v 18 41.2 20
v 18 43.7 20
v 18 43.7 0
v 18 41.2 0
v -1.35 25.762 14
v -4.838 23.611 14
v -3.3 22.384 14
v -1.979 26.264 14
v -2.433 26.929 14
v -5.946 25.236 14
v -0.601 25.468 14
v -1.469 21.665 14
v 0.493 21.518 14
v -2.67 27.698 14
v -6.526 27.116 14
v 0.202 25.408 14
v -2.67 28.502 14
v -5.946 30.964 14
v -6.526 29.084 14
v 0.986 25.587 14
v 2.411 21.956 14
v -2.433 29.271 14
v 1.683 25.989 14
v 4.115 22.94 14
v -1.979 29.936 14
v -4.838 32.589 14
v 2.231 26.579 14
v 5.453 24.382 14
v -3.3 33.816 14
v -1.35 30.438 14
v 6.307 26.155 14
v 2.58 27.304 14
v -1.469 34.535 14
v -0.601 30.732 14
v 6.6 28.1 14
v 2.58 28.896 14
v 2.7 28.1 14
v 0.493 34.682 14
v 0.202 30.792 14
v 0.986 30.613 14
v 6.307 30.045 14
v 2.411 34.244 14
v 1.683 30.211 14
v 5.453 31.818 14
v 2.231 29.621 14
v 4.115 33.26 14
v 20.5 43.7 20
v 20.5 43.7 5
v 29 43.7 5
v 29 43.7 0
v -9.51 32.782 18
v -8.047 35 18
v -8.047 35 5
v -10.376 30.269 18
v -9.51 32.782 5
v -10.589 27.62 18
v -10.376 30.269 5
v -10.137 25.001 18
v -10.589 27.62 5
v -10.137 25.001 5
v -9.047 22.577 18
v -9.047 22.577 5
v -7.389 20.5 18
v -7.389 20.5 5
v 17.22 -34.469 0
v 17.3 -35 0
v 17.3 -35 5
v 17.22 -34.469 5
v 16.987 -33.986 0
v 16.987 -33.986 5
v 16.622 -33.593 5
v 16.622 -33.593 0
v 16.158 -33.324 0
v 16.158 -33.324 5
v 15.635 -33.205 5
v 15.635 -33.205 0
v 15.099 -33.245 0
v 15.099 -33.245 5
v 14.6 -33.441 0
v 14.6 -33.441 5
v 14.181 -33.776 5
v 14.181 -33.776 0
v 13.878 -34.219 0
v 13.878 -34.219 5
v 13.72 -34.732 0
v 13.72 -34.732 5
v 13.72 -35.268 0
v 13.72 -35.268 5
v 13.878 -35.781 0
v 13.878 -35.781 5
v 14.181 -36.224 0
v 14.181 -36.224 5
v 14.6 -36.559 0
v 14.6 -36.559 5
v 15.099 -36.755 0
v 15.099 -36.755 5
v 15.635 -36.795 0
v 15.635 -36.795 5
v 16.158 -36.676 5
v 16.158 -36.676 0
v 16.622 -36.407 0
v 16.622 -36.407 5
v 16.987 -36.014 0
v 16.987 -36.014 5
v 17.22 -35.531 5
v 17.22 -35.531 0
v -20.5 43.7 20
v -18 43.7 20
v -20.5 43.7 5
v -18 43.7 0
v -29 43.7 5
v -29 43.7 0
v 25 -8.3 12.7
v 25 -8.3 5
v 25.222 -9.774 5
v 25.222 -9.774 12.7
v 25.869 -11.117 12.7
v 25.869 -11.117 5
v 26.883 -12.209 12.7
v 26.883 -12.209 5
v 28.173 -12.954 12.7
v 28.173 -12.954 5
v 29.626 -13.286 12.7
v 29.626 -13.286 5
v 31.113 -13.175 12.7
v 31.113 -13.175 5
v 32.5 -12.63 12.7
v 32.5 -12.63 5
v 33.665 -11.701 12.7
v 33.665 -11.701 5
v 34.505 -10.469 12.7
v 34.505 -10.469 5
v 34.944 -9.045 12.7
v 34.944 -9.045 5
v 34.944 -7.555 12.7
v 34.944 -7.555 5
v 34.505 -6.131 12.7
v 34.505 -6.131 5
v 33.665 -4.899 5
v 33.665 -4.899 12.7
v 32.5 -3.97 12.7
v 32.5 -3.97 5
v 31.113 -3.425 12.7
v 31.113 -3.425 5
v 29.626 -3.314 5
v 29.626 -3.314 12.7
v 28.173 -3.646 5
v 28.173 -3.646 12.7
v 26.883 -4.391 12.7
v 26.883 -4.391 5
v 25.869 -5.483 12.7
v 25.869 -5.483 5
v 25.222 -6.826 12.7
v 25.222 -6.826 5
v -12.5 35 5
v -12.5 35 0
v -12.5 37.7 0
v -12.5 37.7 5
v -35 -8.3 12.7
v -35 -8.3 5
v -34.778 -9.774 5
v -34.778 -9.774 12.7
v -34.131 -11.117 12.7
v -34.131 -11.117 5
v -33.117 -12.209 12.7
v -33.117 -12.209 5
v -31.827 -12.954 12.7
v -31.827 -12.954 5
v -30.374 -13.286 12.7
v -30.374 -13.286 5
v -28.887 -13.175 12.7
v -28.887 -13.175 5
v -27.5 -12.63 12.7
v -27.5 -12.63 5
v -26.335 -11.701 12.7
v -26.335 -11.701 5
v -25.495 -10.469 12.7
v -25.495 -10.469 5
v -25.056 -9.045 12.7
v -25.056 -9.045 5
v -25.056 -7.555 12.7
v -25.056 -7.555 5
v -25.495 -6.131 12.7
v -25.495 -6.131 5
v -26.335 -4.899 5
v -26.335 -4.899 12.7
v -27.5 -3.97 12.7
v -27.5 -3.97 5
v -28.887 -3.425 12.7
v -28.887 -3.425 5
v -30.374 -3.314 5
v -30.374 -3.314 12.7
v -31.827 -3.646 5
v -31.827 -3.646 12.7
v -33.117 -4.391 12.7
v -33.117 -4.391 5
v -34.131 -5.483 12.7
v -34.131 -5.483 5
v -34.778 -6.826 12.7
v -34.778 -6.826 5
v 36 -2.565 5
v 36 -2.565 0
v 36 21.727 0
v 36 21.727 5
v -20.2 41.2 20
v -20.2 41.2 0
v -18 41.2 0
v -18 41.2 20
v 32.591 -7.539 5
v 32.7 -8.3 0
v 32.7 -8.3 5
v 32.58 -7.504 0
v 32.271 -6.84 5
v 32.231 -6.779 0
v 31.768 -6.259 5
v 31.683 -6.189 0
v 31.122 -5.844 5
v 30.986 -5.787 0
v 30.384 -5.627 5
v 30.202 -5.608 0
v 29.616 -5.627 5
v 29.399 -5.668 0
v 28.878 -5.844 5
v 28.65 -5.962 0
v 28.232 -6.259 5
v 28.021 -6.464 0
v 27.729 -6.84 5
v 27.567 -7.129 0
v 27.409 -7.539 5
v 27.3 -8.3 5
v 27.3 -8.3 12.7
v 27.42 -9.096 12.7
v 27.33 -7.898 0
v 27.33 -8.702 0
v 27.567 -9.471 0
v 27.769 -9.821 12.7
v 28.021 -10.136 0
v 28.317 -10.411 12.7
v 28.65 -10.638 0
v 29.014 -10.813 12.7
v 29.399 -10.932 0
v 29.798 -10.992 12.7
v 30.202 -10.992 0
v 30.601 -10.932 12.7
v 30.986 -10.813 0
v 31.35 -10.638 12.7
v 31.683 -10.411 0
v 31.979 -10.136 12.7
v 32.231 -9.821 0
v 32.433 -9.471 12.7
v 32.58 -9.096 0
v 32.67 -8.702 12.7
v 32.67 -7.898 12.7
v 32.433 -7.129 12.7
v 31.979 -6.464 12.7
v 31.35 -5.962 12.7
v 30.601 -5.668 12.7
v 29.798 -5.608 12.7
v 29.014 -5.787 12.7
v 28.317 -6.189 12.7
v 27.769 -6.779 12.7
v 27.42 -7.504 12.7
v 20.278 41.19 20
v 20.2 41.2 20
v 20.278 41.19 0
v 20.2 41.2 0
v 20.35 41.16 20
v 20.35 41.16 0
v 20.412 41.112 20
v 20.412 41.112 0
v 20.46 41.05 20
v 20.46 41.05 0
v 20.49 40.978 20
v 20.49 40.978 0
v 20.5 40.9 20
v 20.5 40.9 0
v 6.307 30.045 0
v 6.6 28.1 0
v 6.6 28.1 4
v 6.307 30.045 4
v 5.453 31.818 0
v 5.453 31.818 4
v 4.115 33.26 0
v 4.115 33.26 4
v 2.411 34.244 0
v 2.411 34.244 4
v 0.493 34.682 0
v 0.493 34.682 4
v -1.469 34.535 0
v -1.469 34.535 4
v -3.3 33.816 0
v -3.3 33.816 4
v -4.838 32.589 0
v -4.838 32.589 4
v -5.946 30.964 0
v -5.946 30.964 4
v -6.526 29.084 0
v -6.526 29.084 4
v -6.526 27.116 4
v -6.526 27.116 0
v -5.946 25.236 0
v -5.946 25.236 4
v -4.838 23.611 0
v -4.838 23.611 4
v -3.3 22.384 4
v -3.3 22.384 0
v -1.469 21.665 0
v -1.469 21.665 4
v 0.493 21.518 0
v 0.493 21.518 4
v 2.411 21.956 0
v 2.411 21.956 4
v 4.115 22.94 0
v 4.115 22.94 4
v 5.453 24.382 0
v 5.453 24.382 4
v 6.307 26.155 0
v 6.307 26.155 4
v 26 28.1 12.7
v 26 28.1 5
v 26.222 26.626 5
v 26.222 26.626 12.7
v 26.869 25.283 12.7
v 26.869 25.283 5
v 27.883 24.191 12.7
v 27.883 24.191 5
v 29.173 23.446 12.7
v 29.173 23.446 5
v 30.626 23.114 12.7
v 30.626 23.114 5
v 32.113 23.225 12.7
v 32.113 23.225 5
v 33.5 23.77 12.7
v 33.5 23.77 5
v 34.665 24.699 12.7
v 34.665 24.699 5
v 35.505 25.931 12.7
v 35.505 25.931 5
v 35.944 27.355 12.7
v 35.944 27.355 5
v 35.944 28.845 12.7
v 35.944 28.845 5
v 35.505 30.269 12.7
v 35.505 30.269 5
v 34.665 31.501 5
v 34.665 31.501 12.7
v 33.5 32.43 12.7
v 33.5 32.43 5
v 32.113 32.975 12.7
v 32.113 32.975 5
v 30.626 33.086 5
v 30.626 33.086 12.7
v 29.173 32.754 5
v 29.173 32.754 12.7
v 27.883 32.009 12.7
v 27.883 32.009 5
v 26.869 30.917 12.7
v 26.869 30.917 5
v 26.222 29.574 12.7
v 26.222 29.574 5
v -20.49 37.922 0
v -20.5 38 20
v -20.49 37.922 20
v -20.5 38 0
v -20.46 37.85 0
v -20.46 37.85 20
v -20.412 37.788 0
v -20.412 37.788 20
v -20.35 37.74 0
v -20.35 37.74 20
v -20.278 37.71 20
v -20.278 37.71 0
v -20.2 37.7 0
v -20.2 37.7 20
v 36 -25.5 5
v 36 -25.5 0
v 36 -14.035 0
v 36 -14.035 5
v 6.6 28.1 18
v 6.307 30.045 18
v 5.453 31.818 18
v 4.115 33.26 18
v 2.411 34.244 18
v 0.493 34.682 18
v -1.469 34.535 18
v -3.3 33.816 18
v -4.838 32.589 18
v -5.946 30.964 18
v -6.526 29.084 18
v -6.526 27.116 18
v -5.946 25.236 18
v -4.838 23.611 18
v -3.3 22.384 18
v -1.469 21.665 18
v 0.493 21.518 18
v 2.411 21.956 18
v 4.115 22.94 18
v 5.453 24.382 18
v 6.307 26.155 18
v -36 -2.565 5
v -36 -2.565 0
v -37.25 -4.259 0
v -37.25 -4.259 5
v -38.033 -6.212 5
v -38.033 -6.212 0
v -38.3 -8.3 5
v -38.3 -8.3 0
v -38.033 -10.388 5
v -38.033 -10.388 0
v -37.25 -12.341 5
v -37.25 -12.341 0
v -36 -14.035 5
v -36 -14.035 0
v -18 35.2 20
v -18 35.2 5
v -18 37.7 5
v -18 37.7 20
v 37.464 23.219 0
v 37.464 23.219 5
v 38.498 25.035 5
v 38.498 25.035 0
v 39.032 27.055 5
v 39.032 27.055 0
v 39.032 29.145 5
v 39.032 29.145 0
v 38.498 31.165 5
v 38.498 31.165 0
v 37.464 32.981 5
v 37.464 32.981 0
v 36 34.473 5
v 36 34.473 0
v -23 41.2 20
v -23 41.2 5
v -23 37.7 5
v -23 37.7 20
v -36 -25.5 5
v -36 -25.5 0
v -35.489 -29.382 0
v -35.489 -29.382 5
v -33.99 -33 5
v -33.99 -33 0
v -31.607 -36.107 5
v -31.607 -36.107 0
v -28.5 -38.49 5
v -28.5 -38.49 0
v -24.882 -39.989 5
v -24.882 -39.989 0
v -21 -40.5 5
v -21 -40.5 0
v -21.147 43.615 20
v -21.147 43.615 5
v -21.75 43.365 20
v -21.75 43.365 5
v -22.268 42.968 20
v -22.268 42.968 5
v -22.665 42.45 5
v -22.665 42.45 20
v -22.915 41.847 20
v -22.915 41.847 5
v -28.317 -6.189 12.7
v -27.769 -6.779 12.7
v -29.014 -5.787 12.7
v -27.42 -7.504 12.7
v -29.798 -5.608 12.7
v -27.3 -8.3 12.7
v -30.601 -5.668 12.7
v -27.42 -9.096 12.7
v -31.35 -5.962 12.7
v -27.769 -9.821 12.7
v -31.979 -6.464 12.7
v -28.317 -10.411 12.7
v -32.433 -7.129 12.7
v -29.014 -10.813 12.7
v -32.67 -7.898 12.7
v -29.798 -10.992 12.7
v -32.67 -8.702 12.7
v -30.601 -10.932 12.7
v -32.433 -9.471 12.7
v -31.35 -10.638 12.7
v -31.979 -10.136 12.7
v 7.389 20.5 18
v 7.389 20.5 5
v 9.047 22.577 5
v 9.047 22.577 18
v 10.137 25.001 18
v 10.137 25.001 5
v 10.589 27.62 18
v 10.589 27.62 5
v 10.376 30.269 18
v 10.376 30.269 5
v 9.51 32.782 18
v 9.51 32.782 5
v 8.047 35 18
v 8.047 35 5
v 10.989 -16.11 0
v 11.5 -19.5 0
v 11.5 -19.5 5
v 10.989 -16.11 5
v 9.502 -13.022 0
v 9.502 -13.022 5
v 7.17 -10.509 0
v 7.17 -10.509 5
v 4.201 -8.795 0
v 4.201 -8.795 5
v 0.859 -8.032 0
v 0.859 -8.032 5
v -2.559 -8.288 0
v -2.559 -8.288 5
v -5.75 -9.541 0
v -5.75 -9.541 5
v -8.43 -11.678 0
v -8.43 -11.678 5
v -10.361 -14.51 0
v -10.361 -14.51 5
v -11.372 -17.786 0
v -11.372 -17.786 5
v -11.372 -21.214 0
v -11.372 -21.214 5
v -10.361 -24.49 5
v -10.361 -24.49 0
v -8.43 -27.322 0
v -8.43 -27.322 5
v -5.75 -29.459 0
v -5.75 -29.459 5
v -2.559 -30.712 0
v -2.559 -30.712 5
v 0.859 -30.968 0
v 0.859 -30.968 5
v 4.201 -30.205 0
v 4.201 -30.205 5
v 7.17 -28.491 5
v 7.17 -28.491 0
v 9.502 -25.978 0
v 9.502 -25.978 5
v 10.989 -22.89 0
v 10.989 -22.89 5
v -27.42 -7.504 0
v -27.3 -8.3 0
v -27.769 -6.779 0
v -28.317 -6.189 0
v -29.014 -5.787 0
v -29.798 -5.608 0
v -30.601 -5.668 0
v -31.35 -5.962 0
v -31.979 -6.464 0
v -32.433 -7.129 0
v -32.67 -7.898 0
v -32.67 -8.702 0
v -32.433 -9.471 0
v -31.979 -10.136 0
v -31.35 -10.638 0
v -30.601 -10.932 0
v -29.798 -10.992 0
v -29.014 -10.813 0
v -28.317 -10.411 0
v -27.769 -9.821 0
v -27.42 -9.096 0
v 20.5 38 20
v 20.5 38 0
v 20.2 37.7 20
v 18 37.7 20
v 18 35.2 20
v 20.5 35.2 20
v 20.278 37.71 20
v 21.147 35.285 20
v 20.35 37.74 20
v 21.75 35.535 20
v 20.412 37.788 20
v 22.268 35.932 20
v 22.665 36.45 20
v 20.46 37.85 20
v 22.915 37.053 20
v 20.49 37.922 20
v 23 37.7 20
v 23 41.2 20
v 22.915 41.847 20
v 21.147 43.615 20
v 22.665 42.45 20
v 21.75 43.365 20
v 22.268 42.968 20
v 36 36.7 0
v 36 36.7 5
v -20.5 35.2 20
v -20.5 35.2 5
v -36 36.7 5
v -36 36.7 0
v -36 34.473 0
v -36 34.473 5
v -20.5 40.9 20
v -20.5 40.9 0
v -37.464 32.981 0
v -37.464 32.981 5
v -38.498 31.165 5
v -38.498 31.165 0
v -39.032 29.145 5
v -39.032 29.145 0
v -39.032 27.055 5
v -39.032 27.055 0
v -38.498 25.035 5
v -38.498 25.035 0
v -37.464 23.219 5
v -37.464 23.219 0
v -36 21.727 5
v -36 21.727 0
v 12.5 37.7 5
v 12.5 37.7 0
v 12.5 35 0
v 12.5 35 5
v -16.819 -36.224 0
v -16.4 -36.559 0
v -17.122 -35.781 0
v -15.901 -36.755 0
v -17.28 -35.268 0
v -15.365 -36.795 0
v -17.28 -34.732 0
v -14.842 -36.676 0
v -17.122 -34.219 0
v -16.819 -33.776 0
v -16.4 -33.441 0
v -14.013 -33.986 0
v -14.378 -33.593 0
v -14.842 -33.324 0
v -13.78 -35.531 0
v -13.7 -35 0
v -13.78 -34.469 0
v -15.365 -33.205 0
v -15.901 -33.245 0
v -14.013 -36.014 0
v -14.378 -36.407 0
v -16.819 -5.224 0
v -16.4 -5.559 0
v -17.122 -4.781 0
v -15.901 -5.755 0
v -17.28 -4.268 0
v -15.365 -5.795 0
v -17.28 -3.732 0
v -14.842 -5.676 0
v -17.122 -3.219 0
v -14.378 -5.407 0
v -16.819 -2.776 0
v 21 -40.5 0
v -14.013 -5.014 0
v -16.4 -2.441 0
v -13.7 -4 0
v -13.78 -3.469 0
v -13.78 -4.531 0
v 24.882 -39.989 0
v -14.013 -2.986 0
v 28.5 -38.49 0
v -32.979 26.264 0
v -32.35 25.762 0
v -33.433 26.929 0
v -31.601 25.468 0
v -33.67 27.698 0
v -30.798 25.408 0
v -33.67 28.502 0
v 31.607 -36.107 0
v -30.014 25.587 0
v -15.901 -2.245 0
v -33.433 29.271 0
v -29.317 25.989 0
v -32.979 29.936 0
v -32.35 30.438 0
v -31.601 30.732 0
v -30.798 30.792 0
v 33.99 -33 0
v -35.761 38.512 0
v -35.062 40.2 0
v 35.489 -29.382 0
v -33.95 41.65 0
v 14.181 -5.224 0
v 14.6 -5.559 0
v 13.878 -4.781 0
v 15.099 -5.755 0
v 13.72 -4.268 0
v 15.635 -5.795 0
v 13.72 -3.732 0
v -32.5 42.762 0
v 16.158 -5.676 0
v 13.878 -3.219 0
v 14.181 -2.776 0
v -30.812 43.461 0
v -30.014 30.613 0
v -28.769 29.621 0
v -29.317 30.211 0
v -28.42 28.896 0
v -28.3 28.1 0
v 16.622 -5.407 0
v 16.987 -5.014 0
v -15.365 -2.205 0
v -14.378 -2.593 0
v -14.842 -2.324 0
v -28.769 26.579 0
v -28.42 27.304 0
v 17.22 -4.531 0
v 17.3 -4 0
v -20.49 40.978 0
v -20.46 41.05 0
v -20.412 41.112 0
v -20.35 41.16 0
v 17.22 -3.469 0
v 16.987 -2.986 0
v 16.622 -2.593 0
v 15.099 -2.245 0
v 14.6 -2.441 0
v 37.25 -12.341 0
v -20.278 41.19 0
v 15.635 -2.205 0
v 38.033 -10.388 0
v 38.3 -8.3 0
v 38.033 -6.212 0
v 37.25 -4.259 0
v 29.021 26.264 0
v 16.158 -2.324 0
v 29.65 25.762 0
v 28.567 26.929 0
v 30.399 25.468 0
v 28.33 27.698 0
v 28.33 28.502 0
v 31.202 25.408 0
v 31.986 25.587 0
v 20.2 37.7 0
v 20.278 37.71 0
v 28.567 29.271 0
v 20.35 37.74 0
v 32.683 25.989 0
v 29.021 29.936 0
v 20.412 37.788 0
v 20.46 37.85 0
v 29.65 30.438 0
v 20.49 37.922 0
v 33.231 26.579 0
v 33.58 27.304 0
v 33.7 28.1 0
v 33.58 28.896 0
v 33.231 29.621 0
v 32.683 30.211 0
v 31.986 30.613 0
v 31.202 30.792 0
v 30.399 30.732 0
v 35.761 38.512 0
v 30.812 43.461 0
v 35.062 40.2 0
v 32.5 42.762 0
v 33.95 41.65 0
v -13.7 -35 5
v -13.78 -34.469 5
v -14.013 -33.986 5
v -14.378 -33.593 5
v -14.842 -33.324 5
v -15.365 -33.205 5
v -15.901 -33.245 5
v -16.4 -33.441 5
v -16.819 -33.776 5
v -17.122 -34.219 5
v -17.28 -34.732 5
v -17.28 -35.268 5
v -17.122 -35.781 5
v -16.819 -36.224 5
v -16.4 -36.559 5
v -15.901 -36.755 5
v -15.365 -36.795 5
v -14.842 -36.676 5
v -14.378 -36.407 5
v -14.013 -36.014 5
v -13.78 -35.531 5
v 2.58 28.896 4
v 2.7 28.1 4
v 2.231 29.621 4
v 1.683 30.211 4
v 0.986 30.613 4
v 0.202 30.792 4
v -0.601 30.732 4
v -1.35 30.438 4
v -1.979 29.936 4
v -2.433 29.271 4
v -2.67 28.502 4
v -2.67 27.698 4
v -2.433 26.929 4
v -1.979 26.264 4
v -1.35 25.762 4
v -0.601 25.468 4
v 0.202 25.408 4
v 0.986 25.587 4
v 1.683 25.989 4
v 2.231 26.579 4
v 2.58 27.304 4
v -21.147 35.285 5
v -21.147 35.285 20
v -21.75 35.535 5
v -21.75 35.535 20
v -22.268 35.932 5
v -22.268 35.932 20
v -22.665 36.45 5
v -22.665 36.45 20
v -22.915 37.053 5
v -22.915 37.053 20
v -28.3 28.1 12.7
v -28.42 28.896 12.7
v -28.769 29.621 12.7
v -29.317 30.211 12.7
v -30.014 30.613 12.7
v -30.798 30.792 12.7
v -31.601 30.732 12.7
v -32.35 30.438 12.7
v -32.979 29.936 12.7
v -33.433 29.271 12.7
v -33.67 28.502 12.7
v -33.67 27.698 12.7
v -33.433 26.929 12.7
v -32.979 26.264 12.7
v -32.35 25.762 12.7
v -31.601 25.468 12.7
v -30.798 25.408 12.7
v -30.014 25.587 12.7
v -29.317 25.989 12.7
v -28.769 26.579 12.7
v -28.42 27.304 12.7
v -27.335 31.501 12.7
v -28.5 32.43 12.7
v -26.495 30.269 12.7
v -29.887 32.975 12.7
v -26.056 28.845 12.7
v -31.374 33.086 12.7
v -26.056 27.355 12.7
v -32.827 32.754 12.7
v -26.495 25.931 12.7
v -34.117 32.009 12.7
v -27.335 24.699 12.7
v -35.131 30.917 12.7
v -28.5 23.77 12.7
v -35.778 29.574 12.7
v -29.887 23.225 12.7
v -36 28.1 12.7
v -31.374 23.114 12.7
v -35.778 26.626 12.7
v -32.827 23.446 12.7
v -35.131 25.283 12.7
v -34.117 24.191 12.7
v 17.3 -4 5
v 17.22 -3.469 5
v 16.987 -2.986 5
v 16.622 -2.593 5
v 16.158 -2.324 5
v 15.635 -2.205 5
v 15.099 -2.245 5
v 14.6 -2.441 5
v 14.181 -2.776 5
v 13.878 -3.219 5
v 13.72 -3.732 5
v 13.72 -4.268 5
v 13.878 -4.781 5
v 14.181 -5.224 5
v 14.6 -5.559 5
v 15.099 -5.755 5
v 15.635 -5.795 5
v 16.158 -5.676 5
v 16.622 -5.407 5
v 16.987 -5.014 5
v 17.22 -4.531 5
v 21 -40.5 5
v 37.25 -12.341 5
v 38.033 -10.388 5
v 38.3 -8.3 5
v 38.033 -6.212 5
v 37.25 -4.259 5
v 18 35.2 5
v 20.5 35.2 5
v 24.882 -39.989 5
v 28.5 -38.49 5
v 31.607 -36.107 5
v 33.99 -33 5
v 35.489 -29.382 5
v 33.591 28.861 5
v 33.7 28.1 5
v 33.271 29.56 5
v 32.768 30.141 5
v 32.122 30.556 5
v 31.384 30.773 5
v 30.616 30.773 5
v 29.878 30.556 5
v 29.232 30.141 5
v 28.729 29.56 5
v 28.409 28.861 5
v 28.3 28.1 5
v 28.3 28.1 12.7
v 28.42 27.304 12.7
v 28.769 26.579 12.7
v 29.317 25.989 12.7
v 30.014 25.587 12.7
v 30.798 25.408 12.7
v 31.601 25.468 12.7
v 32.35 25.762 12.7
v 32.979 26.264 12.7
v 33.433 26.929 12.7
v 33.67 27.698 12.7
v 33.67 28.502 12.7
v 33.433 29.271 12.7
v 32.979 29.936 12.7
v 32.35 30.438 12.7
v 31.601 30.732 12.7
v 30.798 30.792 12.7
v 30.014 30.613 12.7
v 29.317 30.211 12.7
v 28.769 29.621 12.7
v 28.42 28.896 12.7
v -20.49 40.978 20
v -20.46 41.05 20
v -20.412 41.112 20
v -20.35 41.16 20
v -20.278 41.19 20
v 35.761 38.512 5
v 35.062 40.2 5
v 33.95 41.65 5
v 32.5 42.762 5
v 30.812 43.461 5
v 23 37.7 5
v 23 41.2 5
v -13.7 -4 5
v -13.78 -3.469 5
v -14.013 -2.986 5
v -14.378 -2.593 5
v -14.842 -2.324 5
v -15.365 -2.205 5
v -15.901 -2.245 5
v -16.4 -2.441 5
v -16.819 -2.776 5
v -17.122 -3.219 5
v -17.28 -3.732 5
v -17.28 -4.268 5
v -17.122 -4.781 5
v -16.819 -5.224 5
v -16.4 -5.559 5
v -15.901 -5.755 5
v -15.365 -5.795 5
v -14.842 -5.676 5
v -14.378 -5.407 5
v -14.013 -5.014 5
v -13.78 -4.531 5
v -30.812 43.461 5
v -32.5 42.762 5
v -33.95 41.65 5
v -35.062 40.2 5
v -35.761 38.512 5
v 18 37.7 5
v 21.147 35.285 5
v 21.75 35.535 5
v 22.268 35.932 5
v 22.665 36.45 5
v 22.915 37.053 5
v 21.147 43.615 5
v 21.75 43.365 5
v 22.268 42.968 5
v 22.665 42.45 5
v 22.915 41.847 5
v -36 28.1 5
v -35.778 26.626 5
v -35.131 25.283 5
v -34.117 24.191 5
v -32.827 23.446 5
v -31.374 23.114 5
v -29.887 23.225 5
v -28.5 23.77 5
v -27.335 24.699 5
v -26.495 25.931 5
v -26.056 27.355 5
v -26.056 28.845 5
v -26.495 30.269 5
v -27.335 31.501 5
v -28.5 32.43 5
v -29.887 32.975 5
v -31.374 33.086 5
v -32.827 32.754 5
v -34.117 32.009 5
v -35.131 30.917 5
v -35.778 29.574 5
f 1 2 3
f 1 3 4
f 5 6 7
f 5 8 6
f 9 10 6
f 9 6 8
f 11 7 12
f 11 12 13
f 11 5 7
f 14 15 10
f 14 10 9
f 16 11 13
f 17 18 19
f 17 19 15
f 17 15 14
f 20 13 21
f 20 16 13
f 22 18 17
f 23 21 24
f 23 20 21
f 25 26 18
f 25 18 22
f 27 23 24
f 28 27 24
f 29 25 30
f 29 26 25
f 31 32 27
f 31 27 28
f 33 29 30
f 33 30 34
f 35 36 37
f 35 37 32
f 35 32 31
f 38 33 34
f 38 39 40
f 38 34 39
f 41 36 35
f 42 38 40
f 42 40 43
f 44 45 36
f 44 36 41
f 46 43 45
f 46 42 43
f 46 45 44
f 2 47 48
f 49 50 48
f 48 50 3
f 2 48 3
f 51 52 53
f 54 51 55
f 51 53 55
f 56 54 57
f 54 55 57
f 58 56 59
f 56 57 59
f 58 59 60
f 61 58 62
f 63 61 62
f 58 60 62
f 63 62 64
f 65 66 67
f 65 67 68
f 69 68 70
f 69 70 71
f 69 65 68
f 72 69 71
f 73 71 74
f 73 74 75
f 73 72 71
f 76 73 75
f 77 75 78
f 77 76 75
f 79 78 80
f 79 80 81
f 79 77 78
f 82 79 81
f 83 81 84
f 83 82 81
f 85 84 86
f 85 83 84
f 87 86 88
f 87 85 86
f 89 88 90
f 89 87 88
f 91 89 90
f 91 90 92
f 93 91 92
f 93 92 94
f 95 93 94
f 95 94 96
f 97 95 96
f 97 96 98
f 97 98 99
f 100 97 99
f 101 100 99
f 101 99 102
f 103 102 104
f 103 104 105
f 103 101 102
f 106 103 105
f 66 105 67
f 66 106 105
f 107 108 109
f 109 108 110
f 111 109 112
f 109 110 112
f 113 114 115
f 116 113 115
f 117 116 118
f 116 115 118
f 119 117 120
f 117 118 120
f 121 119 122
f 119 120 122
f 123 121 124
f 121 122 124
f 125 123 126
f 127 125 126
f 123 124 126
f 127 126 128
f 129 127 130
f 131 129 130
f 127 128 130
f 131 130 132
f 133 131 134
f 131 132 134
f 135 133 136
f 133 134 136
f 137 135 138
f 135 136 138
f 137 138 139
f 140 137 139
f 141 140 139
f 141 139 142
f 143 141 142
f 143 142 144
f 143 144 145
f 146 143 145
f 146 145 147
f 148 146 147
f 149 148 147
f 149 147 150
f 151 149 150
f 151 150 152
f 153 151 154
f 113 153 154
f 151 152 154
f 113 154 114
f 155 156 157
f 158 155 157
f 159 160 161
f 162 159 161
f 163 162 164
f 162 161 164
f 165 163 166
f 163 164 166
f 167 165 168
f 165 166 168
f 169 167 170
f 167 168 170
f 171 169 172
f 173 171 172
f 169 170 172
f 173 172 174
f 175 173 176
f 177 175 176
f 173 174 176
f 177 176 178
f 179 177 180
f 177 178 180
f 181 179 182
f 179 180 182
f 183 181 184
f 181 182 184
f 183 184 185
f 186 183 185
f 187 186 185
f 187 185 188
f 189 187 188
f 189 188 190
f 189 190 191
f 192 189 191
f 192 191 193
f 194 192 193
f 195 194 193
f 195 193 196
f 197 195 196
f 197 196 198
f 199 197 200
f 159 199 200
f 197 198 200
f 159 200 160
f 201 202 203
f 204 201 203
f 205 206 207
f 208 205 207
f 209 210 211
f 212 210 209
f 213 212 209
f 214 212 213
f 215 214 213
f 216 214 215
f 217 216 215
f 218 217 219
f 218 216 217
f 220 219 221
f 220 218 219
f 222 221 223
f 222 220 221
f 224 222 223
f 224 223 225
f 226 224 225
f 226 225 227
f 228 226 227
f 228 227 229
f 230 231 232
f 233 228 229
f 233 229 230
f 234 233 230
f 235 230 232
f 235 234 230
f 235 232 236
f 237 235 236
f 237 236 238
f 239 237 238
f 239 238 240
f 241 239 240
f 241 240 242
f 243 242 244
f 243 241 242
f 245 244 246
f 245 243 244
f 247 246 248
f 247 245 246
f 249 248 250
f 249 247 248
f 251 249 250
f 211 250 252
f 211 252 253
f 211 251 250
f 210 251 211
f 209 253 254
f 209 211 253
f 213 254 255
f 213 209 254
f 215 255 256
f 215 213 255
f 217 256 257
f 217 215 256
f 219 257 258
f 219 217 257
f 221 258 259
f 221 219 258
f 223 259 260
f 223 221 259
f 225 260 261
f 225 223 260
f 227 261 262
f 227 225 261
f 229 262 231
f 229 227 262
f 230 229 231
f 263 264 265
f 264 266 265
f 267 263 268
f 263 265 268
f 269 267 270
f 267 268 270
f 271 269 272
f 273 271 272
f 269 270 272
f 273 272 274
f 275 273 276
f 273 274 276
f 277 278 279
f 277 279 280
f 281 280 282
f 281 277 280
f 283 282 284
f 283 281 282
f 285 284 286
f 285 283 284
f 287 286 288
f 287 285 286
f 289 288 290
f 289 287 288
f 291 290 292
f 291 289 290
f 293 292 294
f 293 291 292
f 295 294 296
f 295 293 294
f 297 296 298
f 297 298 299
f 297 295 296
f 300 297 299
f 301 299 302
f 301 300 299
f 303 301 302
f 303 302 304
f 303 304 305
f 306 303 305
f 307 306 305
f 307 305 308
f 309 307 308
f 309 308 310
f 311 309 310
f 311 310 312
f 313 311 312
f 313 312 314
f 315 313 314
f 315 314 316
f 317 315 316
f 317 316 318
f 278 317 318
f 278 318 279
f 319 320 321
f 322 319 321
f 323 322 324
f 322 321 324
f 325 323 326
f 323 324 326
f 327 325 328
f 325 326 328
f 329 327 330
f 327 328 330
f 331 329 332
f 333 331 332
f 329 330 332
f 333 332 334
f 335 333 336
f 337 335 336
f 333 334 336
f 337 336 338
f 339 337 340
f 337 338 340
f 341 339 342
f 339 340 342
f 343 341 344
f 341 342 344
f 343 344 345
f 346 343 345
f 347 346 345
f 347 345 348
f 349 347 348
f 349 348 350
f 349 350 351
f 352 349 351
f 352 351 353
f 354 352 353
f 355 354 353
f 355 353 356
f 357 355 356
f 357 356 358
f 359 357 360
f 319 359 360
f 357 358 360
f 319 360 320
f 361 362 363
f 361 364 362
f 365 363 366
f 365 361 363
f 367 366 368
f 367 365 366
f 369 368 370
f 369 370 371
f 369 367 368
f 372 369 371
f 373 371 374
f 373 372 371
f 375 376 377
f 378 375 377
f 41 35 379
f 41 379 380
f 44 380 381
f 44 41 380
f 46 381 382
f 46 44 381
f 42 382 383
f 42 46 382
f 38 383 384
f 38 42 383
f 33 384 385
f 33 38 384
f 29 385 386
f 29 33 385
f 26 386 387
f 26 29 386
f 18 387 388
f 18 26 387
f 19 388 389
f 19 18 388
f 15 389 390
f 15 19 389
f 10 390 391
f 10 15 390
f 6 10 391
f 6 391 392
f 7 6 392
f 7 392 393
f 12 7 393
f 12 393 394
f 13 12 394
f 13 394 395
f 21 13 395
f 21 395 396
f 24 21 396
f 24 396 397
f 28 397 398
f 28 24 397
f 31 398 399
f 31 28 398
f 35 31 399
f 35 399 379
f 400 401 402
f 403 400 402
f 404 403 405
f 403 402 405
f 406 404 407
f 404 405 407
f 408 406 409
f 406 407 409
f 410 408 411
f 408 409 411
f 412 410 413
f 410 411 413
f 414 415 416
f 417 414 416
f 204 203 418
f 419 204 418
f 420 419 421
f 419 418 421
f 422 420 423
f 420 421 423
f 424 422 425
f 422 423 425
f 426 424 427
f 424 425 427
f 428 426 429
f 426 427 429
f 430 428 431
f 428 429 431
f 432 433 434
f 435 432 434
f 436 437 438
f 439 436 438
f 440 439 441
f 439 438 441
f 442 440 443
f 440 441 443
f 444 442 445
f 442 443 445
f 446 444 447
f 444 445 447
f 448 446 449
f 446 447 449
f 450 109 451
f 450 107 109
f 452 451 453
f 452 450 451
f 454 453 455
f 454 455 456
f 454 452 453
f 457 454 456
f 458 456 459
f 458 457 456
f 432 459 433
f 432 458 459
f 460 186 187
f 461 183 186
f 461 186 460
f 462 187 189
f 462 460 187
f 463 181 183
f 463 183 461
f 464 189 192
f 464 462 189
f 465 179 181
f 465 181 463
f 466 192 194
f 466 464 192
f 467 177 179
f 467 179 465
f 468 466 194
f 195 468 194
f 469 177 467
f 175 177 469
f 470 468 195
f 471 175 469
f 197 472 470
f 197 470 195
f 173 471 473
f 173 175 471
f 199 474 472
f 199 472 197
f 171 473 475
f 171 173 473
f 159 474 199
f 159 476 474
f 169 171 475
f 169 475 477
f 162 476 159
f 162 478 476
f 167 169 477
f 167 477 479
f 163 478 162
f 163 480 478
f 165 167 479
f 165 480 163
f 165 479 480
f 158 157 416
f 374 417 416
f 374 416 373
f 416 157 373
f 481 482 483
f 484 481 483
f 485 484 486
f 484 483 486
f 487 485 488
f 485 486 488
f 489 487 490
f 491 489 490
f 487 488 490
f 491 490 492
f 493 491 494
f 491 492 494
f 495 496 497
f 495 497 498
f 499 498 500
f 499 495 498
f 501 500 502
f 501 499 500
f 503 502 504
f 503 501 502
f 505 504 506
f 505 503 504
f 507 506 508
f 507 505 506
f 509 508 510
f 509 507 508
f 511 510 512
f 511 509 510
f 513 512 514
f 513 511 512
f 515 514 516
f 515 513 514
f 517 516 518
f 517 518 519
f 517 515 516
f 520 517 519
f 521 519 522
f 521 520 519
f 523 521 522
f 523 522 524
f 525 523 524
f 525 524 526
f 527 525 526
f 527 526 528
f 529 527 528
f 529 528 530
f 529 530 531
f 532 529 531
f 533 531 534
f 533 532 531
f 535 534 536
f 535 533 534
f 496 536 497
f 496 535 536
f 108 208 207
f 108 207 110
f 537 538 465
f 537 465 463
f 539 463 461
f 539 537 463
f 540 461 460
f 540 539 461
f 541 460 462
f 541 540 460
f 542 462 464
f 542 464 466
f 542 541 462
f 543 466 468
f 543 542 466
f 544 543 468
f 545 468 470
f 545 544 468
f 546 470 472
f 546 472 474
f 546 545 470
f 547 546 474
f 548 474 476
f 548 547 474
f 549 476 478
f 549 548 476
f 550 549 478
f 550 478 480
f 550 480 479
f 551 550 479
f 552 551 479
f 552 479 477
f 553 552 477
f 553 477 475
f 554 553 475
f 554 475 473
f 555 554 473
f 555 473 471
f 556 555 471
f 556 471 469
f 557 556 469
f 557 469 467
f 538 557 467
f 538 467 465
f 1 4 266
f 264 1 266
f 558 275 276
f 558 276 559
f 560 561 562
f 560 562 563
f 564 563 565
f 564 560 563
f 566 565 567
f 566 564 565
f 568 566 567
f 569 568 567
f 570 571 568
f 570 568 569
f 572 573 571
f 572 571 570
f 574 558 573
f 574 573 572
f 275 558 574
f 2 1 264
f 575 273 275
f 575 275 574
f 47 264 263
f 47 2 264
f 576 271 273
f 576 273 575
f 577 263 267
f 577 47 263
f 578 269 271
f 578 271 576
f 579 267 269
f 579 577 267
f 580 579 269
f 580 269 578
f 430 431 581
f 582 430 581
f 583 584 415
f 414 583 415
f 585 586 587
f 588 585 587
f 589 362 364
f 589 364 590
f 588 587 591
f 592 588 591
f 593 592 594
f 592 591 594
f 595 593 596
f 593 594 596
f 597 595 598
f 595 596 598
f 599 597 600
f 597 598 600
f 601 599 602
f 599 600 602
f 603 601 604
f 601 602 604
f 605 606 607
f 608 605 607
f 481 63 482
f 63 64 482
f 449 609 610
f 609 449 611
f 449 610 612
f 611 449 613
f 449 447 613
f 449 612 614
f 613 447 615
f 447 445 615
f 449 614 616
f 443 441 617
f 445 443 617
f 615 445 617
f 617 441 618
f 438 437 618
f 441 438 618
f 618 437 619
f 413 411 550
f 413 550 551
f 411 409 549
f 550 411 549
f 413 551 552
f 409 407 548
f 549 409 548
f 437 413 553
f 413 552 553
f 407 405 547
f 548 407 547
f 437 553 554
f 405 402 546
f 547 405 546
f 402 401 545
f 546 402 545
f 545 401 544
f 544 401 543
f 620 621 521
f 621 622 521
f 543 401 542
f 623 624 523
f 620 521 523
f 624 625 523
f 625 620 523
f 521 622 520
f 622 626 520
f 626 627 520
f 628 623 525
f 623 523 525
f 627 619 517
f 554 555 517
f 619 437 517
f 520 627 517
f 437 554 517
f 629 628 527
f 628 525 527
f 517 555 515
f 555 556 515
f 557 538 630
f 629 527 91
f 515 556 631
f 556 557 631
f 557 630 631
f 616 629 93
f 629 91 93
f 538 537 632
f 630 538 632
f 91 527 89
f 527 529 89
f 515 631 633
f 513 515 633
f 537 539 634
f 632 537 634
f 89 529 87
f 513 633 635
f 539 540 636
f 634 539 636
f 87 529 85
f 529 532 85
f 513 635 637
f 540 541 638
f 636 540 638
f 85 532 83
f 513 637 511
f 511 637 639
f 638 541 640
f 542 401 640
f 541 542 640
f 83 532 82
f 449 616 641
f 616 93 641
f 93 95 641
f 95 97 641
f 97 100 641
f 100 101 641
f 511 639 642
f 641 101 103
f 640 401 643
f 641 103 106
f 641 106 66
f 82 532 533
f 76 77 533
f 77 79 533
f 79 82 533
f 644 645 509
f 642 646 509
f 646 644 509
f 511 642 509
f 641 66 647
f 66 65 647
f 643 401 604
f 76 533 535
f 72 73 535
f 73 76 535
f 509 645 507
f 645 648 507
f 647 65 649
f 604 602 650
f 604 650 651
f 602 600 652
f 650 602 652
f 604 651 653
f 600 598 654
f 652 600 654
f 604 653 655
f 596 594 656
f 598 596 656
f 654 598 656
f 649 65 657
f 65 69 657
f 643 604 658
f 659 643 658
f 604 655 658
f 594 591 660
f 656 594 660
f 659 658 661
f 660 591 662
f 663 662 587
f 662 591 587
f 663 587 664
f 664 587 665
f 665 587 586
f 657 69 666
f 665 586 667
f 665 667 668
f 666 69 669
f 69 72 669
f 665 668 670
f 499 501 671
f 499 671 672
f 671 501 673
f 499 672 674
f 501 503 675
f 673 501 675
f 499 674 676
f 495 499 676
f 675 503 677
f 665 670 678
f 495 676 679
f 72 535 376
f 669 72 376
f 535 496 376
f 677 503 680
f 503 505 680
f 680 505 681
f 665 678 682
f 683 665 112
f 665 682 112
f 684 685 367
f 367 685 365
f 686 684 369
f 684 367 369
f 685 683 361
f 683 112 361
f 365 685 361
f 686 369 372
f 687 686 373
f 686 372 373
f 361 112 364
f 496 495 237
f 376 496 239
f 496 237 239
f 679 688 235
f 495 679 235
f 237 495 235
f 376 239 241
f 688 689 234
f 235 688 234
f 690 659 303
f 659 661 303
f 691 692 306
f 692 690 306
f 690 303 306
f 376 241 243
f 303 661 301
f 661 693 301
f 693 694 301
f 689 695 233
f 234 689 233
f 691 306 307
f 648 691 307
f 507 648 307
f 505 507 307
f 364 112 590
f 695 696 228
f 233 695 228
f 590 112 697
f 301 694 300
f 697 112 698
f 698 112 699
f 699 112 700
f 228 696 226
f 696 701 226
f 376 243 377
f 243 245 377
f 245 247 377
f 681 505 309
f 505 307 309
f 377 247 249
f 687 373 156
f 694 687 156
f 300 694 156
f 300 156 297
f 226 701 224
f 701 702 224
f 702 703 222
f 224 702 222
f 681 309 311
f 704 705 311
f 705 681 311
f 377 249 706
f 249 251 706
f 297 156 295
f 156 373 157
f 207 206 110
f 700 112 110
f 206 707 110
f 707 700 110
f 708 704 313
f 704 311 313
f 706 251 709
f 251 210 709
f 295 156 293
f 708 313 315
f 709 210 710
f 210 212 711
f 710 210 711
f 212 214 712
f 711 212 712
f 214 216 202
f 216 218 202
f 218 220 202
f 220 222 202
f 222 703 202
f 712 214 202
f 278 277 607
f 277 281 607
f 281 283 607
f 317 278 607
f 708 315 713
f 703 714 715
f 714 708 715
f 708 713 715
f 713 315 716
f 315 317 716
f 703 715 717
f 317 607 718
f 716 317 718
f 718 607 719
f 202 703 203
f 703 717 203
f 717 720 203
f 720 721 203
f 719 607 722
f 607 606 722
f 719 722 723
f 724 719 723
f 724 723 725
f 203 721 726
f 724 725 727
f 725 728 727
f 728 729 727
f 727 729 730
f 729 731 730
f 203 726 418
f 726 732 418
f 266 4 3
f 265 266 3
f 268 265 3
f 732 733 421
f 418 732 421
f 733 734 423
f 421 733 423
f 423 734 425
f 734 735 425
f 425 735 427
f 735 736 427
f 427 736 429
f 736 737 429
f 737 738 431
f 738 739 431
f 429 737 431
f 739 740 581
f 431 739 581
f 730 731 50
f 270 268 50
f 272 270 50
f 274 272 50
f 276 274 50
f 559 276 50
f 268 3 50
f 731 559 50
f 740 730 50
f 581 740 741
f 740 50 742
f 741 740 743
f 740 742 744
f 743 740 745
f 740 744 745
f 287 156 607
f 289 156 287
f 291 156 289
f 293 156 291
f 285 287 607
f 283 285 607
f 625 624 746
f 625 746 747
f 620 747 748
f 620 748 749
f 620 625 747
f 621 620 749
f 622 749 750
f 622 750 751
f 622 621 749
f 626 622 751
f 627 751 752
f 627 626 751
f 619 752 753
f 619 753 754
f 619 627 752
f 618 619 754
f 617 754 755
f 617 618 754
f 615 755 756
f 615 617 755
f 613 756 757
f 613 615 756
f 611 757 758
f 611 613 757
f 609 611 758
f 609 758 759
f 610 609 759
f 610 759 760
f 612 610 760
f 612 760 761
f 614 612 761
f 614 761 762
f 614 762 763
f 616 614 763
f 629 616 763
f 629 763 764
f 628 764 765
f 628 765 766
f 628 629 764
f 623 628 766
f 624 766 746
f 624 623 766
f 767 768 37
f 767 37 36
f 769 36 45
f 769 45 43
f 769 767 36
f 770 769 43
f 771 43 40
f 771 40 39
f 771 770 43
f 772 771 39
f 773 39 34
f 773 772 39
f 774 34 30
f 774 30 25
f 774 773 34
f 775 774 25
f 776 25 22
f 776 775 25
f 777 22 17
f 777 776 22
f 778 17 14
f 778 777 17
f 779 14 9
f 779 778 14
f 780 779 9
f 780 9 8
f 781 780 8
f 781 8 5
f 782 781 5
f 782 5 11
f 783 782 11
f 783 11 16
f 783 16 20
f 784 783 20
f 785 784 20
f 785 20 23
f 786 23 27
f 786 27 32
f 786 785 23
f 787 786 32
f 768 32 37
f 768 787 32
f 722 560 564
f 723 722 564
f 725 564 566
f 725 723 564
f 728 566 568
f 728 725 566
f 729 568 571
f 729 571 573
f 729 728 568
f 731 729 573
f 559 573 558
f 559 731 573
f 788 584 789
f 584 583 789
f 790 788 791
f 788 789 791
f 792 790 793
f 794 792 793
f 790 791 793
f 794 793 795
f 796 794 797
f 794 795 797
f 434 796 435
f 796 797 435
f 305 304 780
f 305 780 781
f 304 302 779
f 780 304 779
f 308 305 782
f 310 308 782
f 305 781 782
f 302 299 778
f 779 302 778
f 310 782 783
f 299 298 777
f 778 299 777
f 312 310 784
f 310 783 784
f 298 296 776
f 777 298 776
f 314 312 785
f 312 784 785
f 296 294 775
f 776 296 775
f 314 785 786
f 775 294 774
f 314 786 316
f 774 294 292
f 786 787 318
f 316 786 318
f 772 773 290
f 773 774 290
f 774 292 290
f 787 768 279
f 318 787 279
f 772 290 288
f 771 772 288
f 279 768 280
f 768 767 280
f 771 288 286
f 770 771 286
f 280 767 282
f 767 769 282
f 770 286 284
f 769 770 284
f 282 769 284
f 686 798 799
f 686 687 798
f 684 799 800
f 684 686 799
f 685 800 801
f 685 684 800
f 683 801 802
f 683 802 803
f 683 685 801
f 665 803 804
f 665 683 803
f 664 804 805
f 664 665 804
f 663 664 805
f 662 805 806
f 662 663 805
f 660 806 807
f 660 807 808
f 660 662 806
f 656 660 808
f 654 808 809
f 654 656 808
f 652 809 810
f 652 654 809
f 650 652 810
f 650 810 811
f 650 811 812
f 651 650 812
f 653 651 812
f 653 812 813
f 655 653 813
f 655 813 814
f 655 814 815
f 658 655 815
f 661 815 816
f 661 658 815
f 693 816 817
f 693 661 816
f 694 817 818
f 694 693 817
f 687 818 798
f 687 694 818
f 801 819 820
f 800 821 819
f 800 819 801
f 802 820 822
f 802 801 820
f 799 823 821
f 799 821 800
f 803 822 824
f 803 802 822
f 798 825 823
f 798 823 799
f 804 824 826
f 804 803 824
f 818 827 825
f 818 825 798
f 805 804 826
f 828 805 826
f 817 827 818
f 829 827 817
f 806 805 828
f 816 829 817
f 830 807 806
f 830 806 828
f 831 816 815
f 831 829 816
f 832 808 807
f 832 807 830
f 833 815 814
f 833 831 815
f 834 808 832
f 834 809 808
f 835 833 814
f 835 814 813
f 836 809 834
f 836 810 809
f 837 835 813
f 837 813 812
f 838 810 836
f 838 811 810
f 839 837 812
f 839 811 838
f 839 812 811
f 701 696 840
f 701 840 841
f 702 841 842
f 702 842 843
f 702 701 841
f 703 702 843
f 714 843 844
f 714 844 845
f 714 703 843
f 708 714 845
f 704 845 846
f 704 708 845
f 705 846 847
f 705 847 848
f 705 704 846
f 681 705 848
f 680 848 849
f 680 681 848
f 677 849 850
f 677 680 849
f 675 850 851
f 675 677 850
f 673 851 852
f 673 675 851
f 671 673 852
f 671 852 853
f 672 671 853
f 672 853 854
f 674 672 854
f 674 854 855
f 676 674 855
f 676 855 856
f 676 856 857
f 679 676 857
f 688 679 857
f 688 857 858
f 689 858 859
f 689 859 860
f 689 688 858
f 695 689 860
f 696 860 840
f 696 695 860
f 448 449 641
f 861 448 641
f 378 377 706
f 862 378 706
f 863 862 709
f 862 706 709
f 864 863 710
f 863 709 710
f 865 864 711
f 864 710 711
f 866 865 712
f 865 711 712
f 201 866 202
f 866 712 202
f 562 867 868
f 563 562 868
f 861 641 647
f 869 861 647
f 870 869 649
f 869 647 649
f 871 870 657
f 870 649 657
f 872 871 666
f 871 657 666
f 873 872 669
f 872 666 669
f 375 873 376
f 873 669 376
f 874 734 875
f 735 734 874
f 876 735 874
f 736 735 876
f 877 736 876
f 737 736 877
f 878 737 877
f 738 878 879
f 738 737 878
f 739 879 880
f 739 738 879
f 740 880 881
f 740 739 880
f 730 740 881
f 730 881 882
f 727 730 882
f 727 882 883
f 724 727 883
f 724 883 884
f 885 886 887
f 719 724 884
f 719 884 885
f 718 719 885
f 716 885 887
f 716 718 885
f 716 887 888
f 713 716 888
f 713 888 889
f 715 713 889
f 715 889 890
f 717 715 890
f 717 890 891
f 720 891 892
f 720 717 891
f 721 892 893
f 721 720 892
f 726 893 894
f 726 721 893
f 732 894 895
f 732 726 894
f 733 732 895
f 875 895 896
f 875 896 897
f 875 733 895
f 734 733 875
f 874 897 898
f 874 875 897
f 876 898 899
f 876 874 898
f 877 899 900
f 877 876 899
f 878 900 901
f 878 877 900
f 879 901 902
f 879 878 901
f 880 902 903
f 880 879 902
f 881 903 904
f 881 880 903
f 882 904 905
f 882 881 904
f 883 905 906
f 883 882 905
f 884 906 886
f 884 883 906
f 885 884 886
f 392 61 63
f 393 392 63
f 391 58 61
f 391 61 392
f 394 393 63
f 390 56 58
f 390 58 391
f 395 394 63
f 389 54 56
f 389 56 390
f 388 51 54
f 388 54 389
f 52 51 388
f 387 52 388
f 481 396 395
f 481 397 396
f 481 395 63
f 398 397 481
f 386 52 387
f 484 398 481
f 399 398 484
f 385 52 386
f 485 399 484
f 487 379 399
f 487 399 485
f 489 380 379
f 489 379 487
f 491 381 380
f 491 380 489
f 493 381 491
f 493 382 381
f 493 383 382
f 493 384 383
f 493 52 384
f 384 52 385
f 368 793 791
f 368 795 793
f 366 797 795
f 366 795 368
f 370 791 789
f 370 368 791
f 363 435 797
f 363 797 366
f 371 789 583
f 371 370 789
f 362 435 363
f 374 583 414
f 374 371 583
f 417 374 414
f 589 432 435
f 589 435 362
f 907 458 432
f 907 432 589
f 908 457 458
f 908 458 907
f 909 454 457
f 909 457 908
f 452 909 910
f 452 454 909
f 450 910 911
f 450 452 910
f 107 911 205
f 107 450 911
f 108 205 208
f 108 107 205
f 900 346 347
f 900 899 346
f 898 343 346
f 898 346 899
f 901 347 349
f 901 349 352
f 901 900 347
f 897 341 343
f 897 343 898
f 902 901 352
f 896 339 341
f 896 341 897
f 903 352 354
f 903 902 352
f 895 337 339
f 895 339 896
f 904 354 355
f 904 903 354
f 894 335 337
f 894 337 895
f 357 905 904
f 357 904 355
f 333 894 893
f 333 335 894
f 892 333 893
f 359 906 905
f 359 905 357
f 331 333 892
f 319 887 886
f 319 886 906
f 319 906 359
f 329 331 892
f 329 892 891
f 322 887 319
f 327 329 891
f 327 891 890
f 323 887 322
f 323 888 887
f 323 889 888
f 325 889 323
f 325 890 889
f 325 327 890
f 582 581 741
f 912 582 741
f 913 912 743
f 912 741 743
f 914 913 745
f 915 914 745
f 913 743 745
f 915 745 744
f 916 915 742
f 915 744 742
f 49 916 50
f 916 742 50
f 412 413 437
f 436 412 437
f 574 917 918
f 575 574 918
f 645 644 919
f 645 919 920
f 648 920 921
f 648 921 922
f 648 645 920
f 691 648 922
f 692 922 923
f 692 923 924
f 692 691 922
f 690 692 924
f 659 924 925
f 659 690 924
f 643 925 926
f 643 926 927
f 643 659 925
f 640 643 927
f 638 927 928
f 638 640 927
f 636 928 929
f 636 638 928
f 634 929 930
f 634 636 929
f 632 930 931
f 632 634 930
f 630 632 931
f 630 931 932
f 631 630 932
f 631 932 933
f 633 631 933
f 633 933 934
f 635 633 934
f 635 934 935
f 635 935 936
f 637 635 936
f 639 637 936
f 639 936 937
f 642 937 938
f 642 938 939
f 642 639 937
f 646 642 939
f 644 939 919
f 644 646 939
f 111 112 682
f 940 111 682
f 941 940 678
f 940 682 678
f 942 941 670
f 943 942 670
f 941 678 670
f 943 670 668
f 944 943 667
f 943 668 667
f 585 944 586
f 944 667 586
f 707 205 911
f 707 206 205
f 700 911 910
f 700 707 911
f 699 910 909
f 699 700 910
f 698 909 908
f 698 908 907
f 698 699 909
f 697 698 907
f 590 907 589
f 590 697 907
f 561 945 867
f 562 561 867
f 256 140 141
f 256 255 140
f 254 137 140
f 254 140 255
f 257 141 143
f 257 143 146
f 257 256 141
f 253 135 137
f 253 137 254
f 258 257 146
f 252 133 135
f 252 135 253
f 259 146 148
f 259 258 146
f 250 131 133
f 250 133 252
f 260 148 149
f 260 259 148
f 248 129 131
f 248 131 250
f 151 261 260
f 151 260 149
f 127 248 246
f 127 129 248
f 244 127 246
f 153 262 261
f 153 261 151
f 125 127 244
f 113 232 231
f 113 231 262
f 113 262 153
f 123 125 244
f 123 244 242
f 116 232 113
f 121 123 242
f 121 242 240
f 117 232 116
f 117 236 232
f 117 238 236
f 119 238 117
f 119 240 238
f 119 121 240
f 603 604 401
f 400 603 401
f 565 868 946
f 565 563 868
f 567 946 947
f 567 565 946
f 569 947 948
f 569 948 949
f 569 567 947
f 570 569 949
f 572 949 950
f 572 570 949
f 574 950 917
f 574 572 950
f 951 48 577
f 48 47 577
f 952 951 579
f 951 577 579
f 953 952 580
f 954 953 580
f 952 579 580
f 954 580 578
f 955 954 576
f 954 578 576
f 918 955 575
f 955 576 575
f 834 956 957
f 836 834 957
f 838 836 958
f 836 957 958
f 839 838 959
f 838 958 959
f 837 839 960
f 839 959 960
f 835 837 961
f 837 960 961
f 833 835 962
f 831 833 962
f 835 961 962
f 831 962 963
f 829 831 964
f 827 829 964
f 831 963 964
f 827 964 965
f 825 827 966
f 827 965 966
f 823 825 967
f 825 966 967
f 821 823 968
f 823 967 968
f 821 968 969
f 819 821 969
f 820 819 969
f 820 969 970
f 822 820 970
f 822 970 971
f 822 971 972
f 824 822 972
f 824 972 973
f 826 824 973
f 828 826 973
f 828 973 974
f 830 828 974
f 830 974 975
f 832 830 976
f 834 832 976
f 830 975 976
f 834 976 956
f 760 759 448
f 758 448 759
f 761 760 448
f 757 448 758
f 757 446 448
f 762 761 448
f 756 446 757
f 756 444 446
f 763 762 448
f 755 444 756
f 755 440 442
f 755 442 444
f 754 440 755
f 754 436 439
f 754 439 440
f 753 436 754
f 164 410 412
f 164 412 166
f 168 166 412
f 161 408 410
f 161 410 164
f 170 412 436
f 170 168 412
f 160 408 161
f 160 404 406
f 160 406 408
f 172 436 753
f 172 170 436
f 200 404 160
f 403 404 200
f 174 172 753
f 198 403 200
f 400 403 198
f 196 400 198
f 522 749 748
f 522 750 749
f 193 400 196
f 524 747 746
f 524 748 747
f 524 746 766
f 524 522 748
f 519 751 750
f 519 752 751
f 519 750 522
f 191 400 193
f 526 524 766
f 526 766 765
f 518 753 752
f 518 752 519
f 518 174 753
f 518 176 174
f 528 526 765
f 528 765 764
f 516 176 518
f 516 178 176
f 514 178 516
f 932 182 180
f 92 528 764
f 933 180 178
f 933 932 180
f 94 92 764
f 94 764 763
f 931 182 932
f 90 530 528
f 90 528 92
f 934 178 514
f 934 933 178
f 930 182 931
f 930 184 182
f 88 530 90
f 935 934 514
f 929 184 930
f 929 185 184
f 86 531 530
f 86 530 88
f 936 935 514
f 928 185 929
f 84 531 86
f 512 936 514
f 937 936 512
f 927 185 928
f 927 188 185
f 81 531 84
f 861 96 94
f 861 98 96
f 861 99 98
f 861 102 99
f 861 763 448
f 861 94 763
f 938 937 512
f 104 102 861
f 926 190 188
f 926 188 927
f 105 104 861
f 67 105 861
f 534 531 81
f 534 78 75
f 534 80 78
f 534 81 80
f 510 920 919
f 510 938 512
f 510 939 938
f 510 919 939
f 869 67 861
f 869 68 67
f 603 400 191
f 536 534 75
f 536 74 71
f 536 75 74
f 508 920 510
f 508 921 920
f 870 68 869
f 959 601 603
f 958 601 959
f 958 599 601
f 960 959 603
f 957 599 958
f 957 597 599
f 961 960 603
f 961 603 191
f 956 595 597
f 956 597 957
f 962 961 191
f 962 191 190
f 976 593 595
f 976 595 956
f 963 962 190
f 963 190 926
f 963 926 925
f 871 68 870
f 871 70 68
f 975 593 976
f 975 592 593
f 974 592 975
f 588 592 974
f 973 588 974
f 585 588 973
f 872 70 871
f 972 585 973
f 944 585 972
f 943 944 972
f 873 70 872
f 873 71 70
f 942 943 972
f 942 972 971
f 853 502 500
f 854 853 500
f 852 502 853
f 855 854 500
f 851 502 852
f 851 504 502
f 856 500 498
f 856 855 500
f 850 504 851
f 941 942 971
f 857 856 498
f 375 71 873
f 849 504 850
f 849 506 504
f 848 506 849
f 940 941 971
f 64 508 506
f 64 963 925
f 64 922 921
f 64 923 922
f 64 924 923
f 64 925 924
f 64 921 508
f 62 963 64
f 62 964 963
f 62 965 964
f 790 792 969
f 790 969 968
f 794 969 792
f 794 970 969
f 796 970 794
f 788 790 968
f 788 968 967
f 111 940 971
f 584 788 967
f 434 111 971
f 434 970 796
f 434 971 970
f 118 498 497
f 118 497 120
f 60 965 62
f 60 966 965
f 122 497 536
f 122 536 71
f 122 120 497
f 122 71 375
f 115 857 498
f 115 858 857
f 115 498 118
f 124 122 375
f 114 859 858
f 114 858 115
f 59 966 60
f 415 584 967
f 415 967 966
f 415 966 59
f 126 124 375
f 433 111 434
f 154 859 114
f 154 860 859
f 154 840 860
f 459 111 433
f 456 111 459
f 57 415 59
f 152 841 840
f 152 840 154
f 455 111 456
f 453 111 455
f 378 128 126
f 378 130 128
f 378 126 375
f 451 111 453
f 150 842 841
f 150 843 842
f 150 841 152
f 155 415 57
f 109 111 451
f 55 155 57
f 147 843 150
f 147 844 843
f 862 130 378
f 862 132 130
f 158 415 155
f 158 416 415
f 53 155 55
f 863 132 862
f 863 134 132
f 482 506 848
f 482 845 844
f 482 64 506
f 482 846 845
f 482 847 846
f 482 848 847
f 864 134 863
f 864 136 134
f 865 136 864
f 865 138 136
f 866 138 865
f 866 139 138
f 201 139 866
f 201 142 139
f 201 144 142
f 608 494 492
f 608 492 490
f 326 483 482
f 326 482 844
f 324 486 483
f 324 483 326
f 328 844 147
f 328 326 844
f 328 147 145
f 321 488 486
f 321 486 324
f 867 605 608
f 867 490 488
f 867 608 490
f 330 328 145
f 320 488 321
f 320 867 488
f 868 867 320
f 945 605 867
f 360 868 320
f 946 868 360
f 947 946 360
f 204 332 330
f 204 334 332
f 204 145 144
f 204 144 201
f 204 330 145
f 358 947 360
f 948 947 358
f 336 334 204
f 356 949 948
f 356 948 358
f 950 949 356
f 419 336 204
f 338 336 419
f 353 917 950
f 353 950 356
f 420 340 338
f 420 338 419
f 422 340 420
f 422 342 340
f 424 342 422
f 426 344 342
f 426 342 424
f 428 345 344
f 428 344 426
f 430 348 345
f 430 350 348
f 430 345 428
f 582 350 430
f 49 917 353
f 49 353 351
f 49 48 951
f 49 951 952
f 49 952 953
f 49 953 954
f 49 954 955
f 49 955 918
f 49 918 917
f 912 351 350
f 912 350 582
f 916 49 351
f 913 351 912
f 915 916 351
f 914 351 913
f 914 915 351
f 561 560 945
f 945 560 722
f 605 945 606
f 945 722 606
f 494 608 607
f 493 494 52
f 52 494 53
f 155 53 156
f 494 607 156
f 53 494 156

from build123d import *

# Parameters (mm, degrees)
SKETCH_1_R      = 2.7
SKETCH_1_R_2    = 6.6
SKETCH_1_R_3    = 1.8
SKETCH_1_R_4    = 11.5
EXTRUDE_1_DEPTH = 5
EXTRUDE_START   = 4
EXTRUDE_3_DEPTH = 16
FILLET_1_R      = 2.5
FILLET_2_R      = 0.3
SKETCH_9_R      = 5
SKETCH_9_R_2    = 2.7
EXTRUDE_4_DEPTH = 7.7
SKETCH_1_5_R    = 6.6
SKETCH_1_5_R_2  = 2.7
EXTRUDE_5_DEPTH = 10
EXTRUDE_START_2 = 14
SKETCH_1_6_R    = 6.6
EXTRUDE_6_DEPTH = 4


with BuildPart() as part:
    # 草图1 → 凸台-拉伸1 (new body)
    with BuildSketch(Plane.XY):
        with BuildLine():
            ThreePointArc((-29, 43.7), (-33.949747468, 41.649747468), (-36, 36.7))
            Line((-36, 36.7), (-36, 34.472597587))
            ThreePointArc((-36, 34.472597587), (-39.1, 28.1), (-36, 21.727402413))
            Line((-36, 21.727402413), (-36, -2.565019616))
            ThreePointArc((-36, -2.565019616), (-38.3, -8.3), (-36, -14.034980384))
            Line((-36, -14.034980384), (-36, -25.5))
            ThreePointArc((-36, -25.5), (-31.606601718, -36.106601718), (-21, -40.5))
            Line((-21, -40.5), (21, -40.5))
            ThreePointArc((21, -40.5), (31.606601718, -36.106601718), (36, -25.5))
            Line((36, -25.5), (36, -14.034980384))
            ThreePointArc((36, -14.034980384), (38.3, -8.3), (36, -2.565019616))
            Line((36, -2.565019616), (36, 21.727402413))
            ThreePointArc((36, 21.727402413), (39.1, 28.1), (36, 34.472597587))
            Line((36, 34.472597587), (36, 36.7))
            ThreePointArc((36, 36.7), (33.949747468, 41.649747468), (29, 43.7))
            Line((29, 43.7), (18, 43.7))
            Line((18, 43.7), (18, 41.2))
            Line((18, 41.2), (20.5, 41.2))
            Line((20.5, 41.2), (20.5, 37.7))
            Line((20.5, 37.7), (12.5, 37.7))
            Line((12.5, 37.7), (12.5, 35))
            Line((12.5, 35), (-12.5, 35))
            Line((-12.5, 35), (-12.5, 37.7))
            Line((-12.5, 37.7), (-20.5, 37.7))
            Line((-20.5, 37.7), (-20.5, 41.2))
            Line((-20.5, 41.2), (-18, 41.2))
            Line((-18, 41.2), (-18, 43.7))
            Line((-18, 43.7), (-29, 43.7))
        make_face()
        with Locations((-31, 28.1)):
            Circle(SKETCH_1_R, mode=Mode.SUBTRACT)
        with Locations((-30, -8.3)):
            Circle(SKETCH_1_R, mode=Mode.SUBTRACT)
        with Locations((0, 28.1)):
            Circle(SKETCH_1_R_2, mode=Mode.SUBTRACT)
        with Locations((15.5, -4)):
            Circle(SKETCH_1_R_3, mode=Mode.SUBTRACT)
        with Locations((0, -19.5)):
            Circle(SKETCH_1_R_4, mode=Mode.SUBTRACT)
        with Locations((15.5, -35)):
            Circle(SKETCH_1_R_3, mode=Mode.SUBTRACT)
        with Locations((-15.5, -35)):
            Circle(SKETCH_1_R_3, mode=Mode.SUBTRACT)
        with Locations((-15.5, -4)):
            Circle(SKETCH_1_R_3, mode=Mode.SUBTRACT)
        with Locations((30, -8.3)):
            Circle(SKETCH_1_R, mode=Mode.SUBTRACT)
        with Locations((31, 28.1)):
            Circle(SKETCH_1_R, mode=Mode.SUBTRACT)
    extrude(amount=EXTRUDE_1_DEPTH)

    # 草图1<4> → 凸台-拉伸3 (add)
    with BuildSketch(Plane.XY.offset(EXTRUDE_START)):
        Polygon((-18, 43.7), (-23, 43.7), (-23, 35.2), (-18, 35.2), (-18, 37.7), (-20.5, 37.7), (-20.5, 41.2), (-18, 41.2), align=None)
        Polygon((20.5, 37.7), (18, 37.7), (18, 35.2), (23, 35.2), (23, 43.7), (18, 43.7), (18, 41.2), (20.5, 41.2), align=None)
    extrude(amount=EXTRUDE_3_DEPTH)

    # 圆角1
    fillet_1_edges = [part.edges().sort_by_distance(p)[0] for p in [
        (-23, 35.2, 12.5),
        (-23, 43.7, 12.5),
        (23, 35.2, 12.5),
        (23, 43.7, 12.5),
    ]]
    fillet(fillet_1_edges, radius=FILLET_1_R)

    # 圆角2
    fillet_2_edges = [part.edges().sort_by_distance(p)[0] for p in [
        (20.5, 37.7, 10),
        (20.5, 41.2, 10),
        (-20.5, 41.2, 10),
        (-20.5, 37.7, 10),
    ]]
    fillet(fillet_2_edges, radius=FILLET_2_R)

    # 草图9 → 凸台-拉伸4 (add)
    # profile 1 of 4: a face of its own
    with BuildSketch(Plane.XY.offset(5)):
        with Locations(Location((-31, 28.1, 0), (0, 0, 180))):
            Circle(SKETCH_9_R)
        with Locations((-31, 28.1)):
            Circle(SKETCH_9_R_2, mode=Mode.SUBTRACT)
    # profile 2 of 4: a face of its own
    with BuildSketch(Plane.XY.offset(5)):
        with Locations(Location((-30, -8.3, 0), (0, 0, 180))):
            Circle(SKETCH_9_R)
        with Locations((-30, -8.3)):
            Circle(SKETCH_9_R_2, mode=Mode.SUBTRACT)
    # profile 3 of 4: a face of its own
    with BuildSketch(Plane.XY.offset(5)):
        with Locations(Location((30, -8.3, 0), (0, 0, 180))):
            Circle(SKETCH_9_R)
        with Locations(Location((30, -8.3, 0), (0, 0, 180))):
            Circle(SKETCH_9_R_2, mode=Mode.SUBTRACT)
    # profile 4 of 4: a face of its own
    with BuildSketch(Plane.XY.offset(5)):
        with Locations(Location((31, 28.1, 0), (0, 0, 180))):
            Circle(SKETCH_9_R)
        with Locations(Location((31, 28.1, 0), (0, 0, 180))):
            Circle(SKETCH_9_R_2, mode=Mode.SUBTRACT)
    extrude(amount=EXTRUDE_4_DEPTH)

    # 草图1<5> → 凸台-拉伸5 (add)
    # profile 1 of 2: a face of its own
    with BuildSketch(Plane.XY.offset(EXTRUDE_START)):
        with BuildLine():
            Line((8.04673847, 35), (-8.04673847, 35))
            ThreePointArc((-8.04673847, 35), (-10.589117274, 27.619796539), (-7.389181281, 20.5))
            Line((-7.389181281, 20.5), (7.389181281, 20.5))
            ThreePointArc((7.389181281, 20.5), (10.589117274, 27.619796539), (8.04673847, 35))
        make_face()
        with Locations((0, 28.1)):
            Circle(SKETCH_1_5_R, mode=Mode.SUBTRACT)
    # profile 2 of 2: a face of its own
    with BuildSketch(Plane.XY.offset(EXTRUDE_START)):
        with Locations((0, 28.1)):
            Circle(SKETCH_1_5_R)
        with Locations((0, 28.1)):
            Circle(SKETCH_1_5_R_2, mode=Mode.SUBTRACT)
    extrude(amount=EXTRUDE_5_DEPTH)

    # 草图1<6> → 凸台-拉伸6 (add)
    with BuildSketch(Plane.XY.offset(EXTRUDE_START_2)):
        with BuildLine():
            Line((8.04673847, 35), (-8.04673847, 35))
            ThreePointArc((-8.04673847, 35), (-10.589117274, 27.619796539), (-7.389181281, 20.5))
            Line((-7.389181281, 20.5), (7.389181281, 20.5))
            ThreePointArc((7.389181281, 20.5), (10.589117274, 27.619796539), (8.04673847, 35))
        make_face()
        with Locations((0, 28.1)):
            Circle(SKETCH_1_6_R, mode=Mode.SUBTRACT)
    extrude(amount=EXTRUDE_6_DEPTH)


solid = part.part
